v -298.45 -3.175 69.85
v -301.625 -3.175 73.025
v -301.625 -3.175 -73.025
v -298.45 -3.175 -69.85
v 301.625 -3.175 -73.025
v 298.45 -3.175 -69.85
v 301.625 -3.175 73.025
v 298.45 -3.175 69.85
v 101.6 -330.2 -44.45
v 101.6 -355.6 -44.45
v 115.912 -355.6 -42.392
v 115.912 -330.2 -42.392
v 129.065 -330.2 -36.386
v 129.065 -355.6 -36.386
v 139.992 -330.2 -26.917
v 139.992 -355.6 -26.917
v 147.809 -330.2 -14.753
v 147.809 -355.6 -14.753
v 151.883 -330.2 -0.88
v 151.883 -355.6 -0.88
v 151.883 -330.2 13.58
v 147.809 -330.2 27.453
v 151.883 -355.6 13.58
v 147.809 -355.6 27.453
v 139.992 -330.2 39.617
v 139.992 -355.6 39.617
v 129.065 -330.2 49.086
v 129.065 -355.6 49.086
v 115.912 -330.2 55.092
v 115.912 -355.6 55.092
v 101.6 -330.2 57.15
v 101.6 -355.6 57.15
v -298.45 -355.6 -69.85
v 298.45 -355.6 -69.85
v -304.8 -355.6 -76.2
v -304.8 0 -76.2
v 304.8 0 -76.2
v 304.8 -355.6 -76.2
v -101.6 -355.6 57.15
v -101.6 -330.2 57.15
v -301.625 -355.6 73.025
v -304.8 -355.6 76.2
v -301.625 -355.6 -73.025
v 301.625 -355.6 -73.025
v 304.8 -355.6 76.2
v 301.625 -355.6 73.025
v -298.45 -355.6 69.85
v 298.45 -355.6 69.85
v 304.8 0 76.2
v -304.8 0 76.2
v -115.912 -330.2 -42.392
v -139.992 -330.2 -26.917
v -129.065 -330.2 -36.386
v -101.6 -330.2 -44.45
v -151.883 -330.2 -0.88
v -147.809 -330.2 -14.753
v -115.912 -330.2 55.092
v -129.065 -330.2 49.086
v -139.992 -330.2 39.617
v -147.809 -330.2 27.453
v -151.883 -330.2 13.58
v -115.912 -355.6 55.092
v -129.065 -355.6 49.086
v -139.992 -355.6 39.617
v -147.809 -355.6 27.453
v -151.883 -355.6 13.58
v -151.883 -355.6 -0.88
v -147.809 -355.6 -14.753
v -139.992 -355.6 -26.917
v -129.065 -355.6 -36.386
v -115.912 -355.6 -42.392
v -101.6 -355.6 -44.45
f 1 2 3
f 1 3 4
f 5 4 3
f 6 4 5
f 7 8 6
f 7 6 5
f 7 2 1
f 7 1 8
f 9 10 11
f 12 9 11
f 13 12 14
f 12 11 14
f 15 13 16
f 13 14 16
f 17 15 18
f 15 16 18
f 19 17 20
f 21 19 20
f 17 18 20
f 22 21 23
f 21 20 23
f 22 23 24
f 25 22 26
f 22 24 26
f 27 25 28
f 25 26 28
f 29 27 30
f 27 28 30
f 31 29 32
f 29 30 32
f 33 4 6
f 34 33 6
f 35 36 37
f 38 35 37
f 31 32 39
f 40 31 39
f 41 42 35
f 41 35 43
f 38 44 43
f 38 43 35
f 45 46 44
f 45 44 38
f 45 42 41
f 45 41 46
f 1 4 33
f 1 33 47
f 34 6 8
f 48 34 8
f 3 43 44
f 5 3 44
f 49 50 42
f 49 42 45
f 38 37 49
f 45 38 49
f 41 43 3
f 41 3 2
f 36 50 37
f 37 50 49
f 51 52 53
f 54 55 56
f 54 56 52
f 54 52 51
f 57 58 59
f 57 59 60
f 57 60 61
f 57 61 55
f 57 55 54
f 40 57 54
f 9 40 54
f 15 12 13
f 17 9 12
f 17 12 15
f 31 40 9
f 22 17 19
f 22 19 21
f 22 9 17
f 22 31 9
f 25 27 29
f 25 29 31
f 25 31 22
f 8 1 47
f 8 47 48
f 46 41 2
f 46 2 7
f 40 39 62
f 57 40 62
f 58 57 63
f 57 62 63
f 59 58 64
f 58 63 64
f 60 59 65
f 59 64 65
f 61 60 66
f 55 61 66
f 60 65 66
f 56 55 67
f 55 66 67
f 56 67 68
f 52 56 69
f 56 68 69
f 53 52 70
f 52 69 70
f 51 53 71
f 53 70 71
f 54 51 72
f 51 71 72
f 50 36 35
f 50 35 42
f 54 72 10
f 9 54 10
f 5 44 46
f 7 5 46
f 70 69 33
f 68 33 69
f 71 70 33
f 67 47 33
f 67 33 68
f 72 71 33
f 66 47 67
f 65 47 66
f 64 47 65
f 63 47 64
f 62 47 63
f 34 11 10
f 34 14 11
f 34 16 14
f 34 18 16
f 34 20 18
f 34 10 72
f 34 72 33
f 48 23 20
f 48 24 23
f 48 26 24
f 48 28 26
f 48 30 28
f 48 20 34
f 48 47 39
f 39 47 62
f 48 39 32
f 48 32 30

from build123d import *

# Parameters (mm, degrees)
F0_W     = 609.6
F0_H     = 152.4
F1_DEPTH = 355.6
F2_W     = 603.25
F2_H     = 146.05
F3_DEPTH = 352.425
F4_W     = 596.9
F4_H     = 139.7
F5_DEPTH = 352.425
F7_DEPTH = 25.4


with BuildPart() as f1:
    # F0 (on Front) → F1 (new body)
    with BuildSketch(Plane.XZ):
        Rectangle(F0_W, F0_H)
    extrude(amount=F1_DEPTH)

    # F2 (on face) → F3 (cut)
    with BuildSketch(Plane.XZ.offset(355.6)):
        Rectangle(F2_W, F2_H)
    extrude(amount=-F3_DEPTH, mode=Mode.SUBTRACT)

    # F4 (on face) → F5 (join, through all)
    with BuildSketch(Plane.XZ.offset(3.175)):
        Rectangle(F4_W, F4_H)
    extrude(amount=F5_DEPTH)

    # F6 (on face) → F7 (cut)
    with BuildSketch(Plane.XZ.offset(355.6)):
        with BuildLine():
            ThreePointArc((-101.6, 57.15), (-152.4, 6.35), (-101.6, -44.45))
            Line((-101.6, -44.45), (0, -44.45))
            Line((0, -44.45), (0, 57.15))
            Line((0, 57.15), (-101.6, 57.15))
        make_face()
        with BuildLine():
            Line((0, 57.15), (0, -44.45))
            Line((0, -44.45), (101.6, -44.45))
            ThreePointArc((101.6, -44.45), (152.4, 6.35), (101.6, 57.15))
            Line((101.6, 57.15), (0, 57.15))
        make_face()
    extrude(amount=-F7_DEPTH, mode=Mode.SUBTRACT)


solid = f1.part
